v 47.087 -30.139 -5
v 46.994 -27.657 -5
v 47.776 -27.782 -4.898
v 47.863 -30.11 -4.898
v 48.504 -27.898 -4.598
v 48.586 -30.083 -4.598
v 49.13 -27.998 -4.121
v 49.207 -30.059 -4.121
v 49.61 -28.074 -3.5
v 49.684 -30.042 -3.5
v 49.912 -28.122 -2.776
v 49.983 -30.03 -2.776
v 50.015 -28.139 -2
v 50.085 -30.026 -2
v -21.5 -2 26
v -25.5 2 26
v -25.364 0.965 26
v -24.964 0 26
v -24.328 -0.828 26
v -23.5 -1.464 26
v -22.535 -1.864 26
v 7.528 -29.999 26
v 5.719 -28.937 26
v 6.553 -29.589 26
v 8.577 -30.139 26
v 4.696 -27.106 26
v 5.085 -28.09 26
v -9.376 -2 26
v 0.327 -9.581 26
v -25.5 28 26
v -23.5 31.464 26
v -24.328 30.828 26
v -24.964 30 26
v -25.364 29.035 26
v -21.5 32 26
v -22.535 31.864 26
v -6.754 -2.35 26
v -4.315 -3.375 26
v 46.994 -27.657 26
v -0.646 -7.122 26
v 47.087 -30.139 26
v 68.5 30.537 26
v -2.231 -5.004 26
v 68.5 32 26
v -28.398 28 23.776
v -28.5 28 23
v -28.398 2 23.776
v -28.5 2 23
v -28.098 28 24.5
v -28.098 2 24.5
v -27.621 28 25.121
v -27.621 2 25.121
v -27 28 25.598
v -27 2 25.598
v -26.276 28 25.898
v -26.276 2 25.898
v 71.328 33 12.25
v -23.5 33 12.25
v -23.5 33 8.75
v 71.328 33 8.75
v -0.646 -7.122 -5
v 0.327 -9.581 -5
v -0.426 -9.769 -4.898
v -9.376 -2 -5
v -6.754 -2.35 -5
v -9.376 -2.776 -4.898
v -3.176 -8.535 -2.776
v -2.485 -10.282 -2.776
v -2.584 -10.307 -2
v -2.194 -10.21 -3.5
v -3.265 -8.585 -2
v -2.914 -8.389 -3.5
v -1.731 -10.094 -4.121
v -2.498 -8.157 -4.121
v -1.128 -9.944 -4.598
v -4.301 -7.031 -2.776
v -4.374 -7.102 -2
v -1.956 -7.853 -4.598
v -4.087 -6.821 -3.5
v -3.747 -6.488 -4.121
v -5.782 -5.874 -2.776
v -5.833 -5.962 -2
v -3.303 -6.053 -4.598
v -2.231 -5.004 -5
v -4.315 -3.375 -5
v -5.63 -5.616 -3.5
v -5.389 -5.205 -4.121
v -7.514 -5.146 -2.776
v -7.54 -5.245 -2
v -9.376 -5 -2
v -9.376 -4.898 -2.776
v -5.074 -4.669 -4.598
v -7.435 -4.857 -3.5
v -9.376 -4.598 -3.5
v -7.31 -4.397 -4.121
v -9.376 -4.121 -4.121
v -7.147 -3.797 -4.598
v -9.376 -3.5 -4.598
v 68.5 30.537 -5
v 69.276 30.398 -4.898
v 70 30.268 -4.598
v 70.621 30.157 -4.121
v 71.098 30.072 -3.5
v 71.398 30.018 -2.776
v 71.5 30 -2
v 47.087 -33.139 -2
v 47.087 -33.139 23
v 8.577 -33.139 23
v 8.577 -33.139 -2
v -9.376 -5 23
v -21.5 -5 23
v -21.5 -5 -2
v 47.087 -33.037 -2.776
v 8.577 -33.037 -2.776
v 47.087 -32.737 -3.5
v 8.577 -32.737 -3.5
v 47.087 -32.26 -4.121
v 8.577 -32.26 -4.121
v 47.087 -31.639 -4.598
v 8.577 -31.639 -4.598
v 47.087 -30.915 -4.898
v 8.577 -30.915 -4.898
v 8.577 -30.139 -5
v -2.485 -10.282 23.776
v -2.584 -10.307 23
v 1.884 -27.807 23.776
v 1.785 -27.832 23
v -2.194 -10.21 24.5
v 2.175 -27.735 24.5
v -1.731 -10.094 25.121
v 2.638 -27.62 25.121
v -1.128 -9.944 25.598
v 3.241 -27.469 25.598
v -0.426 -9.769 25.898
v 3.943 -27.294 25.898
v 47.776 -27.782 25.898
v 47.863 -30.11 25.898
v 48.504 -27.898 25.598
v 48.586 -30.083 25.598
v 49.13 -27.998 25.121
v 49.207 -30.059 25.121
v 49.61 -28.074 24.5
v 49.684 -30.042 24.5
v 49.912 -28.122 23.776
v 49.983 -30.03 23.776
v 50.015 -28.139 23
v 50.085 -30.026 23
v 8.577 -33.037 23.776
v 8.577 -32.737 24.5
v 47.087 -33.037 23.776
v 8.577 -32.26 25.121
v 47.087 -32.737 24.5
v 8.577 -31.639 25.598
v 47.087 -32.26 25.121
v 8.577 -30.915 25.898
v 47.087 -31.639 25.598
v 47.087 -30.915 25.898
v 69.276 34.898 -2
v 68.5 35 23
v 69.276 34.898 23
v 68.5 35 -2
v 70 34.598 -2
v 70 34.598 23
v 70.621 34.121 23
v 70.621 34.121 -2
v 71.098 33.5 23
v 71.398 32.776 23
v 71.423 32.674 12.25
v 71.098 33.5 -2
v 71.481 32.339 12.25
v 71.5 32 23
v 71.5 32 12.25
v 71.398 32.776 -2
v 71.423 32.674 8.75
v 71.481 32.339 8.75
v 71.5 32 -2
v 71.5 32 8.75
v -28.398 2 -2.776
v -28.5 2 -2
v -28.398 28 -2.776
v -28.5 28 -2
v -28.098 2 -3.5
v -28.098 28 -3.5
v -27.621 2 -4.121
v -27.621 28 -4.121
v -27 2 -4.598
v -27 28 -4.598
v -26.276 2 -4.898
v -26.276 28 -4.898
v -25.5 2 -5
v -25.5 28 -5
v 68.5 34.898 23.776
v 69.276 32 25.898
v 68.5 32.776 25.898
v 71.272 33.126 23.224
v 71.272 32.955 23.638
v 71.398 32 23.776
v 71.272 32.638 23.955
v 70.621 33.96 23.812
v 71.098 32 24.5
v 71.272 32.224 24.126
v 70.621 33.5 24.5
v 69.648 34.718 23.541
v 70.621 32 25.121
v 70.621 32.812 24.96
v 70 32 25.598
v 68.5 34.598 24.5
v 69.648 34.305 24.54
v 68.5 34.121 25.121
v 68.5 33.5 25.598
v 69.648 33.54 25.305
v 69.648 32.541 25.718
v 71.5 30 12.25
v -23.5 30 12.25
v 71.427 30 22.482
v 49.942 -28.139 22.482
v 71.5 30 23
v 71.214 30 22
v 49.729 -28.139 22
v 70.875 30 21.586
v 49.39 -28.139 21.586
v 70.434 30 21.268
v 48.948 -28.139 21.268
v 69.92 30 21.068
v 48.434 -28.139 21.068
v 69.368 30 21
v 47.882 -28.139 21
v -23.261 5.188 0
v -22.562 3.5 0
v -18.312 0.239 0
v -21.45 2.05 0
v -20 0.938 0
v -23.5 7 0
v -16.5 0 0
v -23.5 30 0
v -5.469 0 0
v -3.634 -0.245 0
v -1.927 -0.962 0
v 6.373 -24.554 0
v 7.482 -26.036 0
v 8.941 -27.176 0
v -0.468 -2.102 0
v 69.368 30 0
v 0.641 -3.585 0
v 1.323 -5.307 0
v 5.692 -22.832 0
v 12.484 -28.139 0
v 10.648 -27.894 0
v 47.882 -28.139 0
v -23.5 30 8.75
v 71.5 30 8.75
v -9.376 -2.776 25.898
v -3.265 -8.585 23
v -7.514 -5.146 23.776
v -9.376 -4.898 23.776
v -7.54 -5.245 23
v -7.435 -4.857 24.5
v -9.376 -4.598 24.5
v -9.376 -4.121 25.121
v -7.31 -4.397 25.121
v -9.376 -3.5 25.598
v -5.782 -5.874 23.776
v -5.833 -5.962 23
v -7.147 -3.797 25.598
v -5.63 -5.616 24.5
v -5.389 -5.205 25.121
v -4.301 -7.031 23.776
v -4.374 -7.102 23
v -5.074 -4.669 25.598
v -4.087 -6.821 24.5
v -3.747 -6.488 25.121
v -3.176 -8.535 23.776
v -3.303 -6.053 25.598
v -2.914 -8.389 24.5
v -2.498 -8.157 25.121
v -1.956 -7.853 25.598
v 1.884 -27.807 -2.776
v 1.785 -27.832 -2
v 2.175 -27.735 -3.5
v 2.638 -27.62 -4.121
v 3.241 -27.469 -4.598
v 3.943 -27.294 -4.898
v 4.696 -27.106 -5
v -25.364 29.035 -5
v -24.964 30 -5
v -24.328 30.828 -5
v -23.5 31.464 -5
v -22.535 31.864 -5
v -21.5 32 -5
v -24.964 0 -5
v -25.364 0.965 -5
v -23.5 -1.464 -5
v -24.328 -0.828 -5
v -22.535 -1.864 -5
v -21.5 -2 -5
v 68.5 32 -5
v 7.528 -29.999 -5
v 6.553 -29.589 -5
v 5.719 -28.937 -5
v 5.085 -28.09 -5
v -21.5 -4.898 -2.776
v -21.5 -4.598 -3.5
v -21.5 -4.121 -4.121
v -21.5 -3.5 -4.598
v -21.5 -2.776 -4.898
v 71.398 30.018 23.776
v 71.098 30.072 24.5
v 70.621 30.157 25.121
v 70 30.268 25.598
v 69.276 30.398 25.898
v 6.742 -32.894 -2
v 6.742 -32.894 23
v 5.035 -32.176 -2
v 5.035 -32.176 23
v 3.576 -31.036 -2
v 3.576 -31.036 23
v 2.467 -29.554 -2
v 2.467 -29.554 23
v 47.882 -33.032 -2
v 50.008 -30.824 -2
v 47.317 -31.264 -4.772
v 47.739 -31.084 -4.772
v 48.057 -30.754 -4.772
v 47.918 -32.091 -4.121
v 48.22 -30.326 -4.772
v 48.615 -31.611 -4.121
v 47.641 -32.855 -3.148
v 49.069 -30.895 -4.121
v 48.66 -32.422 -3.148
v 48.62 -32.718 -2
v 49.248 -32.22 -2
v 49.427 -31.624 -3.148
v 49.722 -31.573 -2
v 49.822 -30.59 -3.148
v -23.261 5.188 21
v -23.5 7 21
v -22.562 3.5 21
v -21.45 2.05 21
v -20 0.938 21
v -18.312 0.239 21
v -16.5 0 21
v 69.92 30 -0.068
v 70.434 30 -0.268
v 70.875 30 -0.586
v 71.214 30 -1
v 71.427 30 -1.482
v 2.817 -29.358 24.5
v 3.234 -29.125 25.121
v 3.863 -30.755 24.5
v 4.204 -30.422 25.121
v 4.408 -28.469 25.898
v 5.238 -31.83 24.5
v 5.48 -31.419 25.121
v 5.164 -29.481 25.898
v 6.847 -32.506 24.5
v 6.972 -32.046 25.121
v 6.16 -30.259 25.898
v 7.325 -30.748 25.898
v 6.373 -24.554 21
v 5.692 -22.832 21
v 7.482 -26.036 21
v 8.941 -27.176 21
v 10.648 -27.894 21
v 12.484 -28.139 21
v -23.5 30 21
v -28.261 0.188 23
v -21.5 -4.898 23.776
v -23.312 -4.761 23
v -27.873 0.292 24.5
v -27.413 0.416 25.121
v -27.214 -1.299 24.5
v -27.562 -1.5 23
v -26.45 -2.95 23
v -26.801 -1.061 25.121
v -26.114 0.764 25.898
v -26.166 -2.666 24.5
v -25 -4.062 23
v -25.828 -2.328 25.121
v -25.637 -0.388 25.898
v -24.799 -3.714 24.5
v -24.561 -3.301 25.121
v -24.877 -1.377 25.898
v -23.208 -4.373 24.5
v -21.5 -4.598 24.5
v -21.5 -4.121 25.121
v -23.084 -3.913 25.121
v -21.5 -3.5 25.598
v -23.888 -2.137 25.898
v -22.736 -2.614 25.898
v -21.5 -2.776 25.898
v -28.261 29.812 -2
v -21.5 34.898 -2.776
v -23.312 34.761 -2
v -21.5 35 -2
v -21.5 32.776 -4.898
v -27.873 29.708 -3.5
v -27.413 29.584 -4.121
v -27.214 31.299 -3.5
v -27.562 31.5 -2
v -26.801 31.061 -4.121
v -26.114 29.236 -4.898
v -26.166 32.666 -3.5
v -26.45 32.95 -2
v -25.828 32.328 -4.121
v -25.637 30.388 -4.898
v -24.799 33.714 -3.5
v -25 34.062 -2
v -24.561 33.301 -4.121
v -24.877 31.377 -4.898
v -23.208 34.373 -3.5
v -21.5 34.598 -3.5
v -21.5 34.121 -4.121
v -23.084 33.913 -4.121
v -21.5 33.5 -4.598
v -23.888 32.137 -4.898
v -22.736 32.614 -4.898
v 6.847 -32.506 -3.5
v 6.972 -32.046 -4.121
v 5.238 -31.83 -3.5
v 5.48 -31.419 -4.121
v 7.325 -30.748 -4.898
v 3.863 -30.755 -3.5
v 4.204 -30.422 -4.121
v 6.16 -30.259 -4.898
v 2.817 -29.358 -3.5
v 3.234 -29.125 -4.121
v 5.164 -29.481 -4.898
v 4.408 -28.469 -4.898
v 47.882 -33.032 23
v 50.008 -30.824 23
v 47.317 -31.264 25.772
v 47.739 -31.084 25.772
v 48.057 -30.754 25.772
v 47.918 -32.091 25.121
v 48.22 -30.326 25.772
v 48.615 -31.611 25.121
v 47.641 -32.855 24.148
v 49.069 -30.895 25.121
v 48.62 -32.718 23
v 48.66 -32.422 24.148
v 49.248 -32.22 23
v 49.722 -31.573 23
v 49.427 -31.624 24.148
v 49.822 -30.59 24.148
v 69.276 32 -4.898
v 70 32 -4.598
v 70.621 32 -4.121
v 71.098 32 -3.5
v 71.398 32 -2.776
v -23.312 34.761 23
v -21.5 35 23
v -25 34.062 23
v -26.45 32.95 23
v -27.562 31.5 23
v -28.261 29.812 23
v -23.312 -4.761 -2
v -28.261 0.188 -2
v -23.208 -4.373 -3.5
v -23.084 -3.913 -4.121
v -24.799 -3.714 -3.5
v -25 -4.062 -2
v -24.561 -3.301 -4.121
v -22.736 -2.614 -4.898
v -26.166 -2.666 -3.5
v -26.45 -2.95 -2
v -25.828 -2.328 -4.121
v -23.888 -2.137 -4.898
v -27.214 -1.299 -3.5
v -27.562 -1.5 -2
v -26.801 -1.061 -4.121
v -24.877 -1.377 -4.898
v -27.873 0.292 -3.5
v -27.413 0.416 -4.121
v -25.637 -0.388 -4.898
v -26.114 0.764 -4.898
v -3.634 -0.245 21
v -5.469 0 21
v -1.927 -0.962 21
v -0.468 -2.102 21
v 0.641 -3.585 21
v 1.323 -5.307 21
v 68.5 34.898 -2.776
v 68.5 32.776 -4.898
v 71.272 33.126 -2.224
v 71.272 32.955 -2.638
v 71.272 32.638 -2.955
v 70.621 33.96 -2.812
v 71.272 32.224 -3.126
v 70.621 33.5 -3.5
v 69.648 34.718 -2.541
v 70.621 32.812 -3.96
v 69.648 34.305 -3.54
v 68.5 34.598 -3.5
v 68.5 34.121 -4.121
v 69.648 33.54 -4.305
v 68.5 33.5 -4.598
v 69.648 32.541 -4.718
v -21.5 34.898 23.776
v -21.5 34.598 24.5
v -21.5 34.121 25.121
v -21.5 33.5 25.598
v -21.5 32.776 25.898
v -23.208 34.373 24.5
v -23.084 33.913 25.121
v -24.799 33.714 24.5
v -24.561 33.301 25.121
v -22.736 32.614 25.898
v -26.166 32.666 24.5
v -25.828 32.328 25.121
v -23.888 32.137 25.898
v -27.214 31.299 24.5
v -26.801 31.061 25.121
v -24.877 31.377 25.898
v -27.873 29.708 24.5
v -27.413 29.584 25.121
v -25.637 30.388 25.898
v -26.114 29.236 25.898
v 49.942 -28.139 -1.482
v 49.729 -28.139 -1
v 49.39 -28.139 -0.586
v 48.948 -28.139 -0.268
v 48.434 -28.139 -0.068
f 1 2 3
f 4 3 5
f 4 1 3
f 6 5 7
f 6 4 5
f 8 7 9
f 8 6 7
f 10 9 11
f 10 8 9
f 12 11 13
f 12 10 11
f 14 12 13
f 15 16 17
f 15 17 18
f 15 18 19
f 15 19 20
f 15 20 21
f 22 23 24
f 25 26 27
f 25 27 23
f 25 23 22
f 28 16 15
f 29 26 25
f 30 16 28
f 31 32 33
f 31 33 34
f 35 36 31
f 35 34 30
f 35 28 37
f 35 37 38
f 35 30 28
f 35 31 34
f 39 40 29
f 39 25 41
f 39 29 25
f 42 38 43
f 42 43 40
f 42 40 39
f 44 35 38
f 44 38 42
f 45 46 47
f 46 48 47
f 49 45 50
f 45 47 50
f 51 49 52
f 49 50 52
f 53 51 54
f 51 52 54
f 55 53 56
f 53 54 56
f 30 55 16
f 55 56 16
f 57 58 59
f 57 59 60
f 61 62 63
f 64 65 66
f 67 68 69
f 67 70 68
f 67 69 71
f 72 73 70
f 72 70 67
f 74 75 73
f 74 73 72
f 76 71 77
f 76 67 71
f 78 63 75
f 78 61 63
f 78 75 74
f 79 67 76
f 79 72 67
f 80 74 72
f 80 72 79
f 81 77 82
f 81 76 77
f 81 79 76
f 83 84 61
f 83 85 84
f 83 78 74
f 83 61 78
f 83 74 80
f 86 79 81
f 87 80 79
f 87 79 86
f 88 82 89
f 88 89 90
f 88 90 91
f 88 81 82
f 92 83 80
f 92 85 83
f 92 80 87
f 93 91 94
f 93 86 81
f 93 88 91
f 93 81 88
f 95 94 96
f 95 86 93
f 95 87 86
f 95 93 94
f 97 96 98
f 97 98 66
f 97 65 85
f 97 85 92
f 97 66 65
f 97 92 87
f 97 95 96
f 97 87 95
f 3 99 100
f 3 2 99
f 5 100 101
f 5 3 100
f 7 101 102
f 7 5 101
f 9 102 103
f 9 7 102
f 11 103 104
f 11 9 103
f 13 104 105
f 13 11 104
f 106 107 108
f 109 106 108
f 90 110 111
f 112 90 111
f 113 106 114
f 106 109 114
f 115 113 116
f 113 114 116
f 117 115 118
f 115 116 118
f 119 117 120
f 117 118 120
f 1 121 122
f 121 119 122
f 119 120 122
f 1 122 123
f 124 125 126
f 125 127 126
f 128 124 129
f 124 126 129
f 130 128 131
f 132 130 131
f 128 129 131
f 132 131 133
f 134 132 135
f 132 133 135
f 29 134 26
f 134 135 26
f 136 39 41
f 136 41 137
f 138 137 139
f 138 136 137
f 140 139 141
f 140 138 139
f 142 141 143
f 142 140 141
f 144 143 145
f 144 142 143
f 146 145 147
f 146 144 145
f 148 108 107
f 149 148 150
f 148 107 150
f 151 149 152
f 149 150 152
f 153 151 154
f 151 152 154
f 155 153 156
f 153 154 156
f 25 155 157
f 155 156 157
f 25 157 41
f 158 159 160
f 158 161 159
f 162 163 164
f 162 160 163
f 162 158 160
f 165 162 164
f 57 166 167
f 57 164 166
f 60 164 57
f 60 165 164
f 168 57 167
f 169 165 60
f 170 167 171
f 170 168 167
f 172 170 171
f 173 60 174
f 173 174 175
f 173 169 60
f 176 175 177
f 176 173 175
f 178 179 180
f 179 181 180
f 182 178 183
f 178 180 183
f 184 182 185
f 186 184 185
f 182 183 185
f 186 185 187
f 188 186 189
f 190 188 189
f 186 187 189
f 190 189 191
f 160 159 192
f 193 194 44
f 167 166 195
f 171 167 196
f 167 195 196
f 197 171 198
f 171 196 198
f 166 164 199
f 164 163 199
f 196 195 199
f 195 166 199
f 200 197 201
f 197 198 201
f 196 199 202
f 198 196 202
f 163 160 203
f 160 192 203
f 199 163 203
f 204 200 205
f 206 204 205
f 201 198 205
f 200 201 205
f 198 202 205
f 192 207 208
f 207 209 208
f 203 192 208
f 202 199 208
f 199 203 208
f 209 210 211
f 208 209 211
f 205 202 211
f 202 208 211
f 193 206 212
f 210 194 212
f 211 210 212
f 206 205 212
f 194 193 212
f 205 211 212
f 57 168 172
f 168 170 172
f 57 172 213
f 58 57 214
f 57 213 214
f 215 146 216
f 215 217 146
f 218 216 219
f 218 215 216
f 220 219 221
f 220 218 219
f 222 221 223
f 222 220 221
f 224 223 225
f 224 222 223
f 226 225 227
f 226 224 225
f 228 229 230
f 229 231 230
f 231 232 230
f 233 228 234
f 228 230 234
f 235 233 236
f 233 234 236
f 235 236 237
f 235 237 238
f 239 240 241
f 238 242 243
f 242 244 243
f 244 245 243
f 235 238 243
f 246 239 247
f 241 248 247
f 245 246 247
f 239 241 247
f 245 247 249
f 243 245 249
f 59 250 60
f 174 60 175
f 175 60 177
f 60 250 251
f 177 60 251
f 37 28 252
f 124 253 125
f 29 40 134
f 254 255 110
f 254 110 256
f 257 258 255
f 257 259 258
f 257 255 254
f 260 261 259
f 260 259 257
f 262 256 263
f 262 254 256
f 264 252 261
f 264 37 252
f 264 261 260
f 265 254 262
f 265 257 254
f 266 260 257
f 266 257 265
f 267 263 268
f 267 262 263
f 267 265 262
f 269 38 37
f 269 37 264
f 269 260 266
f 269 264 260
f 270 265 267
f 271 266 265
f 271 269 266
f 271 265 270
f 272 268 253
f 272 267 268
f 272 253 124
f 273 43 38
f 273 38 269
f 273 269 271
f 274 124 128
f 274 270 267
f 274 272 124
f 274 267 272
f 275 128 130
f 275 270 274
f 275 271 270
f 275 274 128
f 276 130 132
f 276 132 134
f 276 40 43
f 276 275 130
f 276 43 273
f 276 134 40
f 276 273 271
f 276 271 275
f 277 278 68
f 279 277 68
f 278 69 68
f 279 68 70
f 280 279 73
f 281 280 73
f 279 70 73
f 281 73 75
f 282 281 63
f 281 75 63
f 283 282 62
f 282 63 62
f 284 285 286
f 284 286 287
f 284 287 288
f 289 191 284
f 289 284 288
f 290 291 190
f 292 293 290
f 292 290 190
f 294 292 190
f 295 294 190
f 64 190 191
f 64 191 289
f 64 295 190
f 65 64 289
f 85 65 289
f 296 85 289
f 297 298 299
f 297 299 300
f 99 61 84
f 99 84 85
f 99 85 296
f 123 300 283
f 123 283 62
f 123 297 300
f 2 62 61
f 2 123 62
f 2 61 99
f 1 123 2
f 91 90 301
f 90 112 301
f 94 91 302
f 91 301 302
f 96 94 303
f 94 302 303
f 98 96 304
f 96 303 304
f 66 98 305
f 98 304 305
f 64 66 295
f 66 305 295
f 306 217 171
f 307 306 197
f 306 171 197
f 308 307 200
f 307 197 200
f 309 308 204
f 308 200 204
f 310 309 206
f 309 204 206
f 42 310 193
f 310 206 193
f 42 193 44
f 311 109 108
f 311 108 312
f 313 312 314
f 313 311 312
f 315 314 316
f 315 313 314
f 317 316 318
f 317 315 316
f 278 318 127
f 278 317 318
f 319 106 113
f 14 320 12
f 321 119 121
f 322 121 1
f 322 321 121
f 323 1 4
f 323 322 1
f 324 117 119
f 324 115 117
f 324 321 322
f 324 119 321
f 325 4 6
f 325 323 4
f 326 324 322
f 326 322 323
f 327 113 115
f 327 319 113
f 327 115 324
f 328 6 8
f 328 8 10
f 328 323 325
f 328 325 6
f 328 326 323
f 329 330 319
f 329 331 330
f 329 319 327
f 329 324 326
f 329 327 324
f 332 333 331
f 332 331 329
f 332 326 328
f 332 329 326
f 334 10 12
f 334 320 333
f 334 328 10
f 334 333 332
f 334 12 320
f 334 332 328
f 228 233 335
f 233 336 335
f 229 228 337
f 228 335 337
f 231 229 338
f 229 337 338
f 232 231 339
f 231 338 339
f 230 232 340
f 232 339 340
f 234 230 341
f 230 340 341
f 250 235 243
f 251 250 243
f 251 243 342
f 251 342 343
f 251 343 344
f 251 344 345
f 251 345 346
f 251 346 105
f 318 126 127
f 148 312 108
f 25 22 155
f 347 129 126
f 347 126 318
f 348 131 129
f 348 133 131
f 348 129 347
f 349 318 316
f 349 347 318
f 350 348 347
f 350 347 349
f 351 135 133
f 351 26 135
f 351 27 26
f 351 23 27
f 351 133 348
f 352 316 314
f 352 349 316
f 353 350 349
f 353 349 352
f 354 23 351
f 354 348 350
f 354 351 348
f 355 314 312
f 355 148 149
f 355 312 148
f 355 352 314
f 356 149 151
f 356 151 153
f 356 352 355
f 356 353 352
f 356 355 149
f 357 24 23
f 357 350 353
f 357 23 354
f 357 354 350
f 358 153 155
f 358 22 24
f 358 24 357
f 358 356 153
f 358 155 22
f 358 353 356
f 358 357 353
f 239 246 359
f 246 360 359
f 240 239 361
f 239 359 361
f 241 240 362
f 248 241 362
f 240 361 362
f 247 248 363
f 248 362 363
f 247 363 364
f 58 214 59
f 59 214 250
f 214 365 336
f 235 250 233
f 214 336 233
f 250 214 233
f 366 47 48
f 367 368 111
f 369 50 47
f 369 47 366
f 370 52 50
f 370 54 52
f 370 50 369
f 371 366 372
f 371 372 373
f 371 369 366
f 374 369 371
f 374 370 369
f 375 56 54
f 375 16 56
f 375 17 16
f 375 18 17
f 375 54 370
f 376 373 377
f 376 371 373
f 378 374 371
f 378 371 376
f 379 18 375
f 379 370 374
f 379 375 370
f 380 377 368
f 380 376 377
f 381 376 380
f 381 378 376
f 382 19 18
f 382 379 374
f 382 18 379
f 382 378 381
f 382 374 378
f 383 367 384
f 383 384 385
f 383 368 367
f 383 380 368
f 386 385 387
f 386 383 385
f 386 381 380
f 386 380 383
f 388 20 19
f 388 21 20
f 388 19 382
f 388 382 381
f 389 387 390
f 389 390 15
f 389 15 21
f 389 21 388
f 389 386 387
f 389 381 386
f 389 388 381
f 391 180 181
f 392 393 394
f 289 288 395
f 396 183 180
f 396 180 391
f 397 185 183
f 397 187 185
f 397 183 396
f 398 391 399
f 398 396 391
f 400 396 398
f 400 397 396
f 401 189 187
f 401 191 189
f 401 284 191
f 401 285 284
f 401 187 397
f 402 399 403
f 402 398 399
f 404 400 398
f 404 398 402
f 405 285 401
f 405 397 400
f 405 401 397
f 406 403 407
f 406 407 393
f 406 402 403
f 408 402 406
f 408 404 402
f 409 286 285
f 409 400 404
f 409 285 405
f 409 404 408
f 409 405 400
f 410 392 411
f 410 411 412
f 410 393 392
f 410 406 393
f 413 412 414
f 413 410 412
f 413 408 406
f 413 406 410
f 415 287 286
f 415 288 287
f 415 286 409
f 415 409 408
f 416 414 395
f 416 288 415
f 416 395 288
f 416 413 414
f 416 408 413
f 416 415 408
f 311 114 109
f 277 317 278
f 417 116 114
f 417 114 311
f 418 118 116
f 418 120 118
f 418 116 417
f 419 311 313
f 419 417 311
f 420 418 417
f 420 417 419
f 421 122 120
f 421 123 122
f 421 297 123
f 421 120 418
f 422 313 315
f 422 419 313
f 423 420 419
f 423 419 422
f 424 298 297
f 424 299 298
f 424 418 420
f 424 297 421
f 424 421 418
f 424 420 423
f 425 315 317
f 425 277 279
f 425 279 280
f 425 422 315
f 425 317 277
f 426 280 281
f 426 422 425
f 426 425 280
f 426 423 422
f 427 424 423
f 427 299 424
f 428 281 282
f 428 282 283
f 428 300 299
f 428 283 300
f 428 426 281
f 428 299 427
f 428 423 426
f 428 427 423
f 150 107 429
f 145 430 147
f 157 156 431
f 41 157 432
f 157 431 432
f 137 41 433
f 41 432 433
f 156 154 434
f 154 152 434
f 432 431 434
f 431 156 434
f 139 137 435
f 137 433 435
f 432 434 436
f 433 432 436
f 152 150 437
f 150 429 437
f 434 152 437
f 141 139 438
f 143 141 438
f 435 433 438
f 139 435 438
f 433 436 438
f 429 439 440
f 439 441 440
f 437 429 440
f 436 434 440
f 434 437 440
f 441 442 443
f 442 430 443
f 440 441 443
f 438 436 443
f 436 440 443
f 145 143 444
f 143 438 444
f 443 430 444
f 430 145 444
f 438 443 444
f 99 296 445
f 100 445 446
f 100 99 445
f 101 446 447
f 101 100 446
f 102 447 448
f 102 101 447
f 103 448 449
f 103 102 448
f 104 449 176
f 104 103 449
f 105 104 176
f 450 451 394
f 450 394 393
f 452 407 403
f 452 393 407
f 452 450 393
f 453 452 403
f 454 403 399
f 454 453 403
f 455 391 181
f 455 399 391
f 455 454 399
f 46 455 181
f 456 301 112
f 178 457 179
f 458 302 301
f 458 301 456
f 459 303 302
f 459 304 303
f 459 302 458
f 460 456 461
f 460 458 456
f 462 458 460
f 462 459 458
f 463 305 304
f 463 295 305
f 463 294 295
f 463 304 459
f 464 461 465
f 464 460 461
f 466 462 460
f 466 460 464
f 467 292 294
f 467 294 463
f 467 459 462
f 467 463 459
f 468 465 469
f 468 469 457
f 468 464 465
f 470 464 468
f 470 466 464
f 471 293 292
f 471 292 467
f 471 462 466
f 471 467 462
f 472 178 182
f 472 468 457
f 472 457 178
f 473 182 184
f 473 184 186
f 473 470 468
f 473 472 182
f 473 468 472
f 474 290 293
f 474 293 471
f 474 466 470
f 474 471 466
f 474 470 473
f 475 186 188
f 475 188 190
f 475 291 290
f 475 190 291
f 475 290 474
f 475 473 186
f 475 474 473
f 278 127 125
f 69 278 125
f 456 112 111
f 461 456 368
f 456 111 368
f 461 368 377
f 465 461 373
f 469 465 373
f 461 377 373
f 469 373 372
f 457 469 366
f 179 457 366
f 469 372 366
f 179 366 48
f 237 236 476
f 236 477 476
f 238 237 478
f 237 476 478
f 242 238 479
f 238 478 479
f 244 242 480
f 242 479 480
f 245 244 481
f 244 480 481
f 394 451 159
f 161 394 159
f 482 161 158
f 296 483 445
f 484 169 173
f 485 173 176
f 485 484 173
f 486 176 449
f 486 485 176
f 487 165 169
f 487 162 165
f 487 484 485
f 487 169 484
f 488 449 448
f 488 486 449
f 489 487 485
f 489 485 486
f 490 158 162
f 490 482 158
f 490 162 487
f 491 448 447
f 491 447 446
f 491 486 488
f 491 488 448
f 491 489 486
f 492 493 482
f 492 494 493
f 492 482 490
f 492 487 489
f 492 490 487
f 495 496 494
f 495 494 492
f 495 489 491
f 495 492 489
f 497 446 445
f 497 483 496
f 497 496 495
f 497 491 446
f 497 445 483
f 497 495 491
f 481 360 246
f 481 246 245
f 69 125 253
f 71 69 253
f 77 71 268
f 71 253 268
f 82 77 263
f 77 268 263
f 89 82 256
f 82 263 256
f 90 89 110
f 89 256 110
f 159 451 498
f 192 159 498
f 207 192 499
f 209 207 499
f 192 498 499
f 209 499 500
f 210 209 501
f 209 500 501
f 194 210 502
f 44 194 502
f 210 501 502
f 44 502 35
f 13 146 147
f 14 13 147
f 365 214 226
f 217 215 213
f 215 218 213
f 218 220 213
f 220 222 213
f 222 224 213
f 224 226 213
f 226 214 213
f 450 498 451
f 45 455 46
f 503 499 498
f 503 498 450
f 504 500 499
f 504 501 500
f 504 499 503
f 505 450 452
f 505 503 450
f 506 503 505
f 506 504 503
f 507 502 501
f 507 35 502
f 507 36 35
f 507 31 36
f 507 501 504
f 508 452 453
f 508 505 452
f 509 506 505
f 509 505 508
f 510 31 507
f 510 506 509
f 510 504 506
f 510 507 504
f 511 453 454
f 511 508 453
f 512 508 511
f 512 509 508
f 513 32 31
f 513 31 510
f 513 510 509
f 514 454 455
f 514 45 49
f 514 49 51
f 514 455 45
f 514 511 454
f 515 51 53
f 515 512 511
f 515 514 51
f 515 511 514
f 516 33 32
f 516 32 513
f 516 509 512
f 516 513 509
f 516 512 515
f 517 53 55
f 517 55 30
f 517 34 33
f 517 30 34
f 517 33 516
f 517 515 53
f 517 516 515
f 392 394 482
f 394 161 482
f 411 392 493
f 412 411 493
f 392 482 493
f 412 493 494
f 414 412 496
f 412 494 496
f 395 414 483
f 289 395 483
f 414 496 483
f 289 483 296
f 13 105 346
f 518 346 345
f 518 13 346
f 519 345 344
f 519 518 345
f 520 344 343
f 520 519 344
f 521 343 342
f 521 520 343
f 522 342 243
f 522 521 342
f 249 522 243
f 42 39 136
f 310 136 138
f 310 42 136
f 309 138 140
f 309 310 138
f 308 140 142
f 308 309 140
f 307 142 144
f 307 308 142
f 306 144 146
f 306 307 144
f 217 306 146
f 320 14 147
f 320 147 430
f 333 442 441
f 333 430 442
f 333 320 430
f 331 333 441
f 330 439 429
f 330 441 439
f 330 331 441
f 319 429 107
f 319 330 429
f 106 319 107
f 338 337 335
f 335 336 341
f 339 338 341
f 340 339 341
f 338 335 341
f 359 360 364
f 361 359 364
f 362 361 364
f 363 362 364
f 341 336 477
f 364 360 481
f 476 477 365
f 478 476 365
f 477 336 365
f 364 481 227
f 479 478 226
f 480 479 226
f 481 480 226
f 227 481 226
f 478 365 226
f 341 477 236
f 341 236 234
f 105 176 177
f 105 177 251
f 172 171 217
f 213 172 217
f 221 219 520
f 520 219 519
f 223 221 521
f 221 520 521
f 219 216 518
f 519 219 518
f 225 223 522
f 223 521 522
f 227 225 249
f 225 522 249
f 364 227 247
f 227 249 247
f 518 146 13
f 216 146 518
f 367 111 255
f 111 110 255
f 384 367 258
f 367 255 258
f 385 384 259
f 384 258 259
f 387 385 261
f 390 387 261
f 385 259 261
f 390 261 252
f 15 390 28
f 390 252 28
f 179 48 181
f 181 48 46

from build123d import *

# Parameters (mm, degrees)
F1_DEPTH = 21
F4_DEPTH = 5
F5_DEPTH = 5
F6_R     = 7
F7_R     = 3
F9_DEPTH = 3
F10_R    = 1.99999


# Not quite as in the source:
# - a fillet or chamfer is up to 0.001 mm smaller than in the source, because OpenCascade refuses the exact size


with BuildPart() as f1:
    # F0 (on Top) → F1 (new body)
    with BuildSketch(Plane.XY):
        Polygon((-23.5, 30), (71.5, 30), (71.5, 35), (-28.5, 35), (-28.5, -5), (-3.906596233, -5), (3.1079638678, -33.1388689644), (50.2020280941, -33.1388689644), (50.0145601007, -28.1388689644), (7.0145601007, -28.1388689644), (0, 0), (-23.5, 0), align=None)
    extrude(amount=F1_DEPTH)

    # F3 (on face) → F4 (join)
    with BuildSketch(Plane.XY.offset(21)):
        Polygon((71.5, 35), (-28.5, 35), (-28.5, -5), (-3.906596233, -5), (3.1079638678, -33.1388689644), (50.2020280941, -33.1388689644), (50.0145601007, -28.1388689644), (71.5, 30), align=None)
    extrude(amount=F4_DEPTH)

    # F2 (on face) → F5 (join)
    with BuildSketch(Plane(origin=(0, 0, 0), x_dir=(1, 0, 0), z_dir=(0, 0, -1))):
        Polygon((-28.5, -35), (71.5, -35), (71.5, -30), (50.0145601007, 28.1388689644), (50.2020280941, 33.1388689644), (3.1079638678, 33.1388689644), (-3.906596233, 5), (-28.5, 5), align=None)
    extrude(amount=F5_DEPTH)

    # F6
    f6_edges = [f1.edges().sort_by_distance(p)[0] for p in [
        (0, 0, 10.5),
        (-3.906596, -5, 10.5),
        (7.01456, -28.138869, 10.5),
        (3.107964, -33.138869, 10.5),
        (-28.5, -5, 10.5),
        (-28.5, 35, 10.5),
        (-23.5, 0, 10.5),
    ]]
    fillet(f6_edges, radius=F6_R)

    # F7
    f7_edges = [f1.edges().sort_by_distance(p)[0] for p in [
        (25, 35, 26),
        (25, 35, -5),
        (71.5, 35, 10.5),
        (-26.449747, 32.949747, 26),
        (71.5, 32.5, 26),
        (-28.5, 15, 26),
        (60.75728, 0.930566, 26),
        (-26.449747, -2.949747, 26),
        (50.108294, -30.638869, 26),
        (-15.437915, -5, 26),
        (29.389613, -33.138869, 26),
        (-5.066085, -6.484015, 26),
        (4.267453, -31.654854, 26),
        (-0.399316, -19.069434, 26),
        (-15.437915, -5, -5),
        (-5.066085, -6.484015, -5),
        (-26.449747, -2.949747, -5),
        (-0.399316, -19.069434, -5),
        (-28.5, 15, -5),
        (4.267453, -31.654854, -5),
        (-26.449747, 32.949747, -5),
        (29.389613, -33.138869, -5),
        (50.108294, -30.638869, -5),
        (71.5, 32.5, -5),
        (60.75728, 0.930566, -5),
        (50.202028, -33.138869, 10.5),
    ]]
    fillet(f7_edges, radius=F7_R)

    # F8 (on face) → F9 (cut)
    with BuildSketch(Plane.XZ.offset(-30)):
        Polygon((-23.5, 12.25), (-23.5, 10.5), (-23.5, 8.75), (74.1642639041, 8.75), (74.1642639041, 12.25), align=None)
    extrude(amount=-F9_DEPTH, mode=Mode.SUBTRACT)

    # F10 (radius 2 in the source; OpenCascade refuses exactly that, so slightly less here)
    f10_edges = [f1.edges().sort_by_distance(p)[0] for p in [
        (60.75728, 0.930566, 21),
        (60.75728, 0.930566, 0),
    ]]
    fillet(f10_edges, radius=F10_R)


solid = f1.part
